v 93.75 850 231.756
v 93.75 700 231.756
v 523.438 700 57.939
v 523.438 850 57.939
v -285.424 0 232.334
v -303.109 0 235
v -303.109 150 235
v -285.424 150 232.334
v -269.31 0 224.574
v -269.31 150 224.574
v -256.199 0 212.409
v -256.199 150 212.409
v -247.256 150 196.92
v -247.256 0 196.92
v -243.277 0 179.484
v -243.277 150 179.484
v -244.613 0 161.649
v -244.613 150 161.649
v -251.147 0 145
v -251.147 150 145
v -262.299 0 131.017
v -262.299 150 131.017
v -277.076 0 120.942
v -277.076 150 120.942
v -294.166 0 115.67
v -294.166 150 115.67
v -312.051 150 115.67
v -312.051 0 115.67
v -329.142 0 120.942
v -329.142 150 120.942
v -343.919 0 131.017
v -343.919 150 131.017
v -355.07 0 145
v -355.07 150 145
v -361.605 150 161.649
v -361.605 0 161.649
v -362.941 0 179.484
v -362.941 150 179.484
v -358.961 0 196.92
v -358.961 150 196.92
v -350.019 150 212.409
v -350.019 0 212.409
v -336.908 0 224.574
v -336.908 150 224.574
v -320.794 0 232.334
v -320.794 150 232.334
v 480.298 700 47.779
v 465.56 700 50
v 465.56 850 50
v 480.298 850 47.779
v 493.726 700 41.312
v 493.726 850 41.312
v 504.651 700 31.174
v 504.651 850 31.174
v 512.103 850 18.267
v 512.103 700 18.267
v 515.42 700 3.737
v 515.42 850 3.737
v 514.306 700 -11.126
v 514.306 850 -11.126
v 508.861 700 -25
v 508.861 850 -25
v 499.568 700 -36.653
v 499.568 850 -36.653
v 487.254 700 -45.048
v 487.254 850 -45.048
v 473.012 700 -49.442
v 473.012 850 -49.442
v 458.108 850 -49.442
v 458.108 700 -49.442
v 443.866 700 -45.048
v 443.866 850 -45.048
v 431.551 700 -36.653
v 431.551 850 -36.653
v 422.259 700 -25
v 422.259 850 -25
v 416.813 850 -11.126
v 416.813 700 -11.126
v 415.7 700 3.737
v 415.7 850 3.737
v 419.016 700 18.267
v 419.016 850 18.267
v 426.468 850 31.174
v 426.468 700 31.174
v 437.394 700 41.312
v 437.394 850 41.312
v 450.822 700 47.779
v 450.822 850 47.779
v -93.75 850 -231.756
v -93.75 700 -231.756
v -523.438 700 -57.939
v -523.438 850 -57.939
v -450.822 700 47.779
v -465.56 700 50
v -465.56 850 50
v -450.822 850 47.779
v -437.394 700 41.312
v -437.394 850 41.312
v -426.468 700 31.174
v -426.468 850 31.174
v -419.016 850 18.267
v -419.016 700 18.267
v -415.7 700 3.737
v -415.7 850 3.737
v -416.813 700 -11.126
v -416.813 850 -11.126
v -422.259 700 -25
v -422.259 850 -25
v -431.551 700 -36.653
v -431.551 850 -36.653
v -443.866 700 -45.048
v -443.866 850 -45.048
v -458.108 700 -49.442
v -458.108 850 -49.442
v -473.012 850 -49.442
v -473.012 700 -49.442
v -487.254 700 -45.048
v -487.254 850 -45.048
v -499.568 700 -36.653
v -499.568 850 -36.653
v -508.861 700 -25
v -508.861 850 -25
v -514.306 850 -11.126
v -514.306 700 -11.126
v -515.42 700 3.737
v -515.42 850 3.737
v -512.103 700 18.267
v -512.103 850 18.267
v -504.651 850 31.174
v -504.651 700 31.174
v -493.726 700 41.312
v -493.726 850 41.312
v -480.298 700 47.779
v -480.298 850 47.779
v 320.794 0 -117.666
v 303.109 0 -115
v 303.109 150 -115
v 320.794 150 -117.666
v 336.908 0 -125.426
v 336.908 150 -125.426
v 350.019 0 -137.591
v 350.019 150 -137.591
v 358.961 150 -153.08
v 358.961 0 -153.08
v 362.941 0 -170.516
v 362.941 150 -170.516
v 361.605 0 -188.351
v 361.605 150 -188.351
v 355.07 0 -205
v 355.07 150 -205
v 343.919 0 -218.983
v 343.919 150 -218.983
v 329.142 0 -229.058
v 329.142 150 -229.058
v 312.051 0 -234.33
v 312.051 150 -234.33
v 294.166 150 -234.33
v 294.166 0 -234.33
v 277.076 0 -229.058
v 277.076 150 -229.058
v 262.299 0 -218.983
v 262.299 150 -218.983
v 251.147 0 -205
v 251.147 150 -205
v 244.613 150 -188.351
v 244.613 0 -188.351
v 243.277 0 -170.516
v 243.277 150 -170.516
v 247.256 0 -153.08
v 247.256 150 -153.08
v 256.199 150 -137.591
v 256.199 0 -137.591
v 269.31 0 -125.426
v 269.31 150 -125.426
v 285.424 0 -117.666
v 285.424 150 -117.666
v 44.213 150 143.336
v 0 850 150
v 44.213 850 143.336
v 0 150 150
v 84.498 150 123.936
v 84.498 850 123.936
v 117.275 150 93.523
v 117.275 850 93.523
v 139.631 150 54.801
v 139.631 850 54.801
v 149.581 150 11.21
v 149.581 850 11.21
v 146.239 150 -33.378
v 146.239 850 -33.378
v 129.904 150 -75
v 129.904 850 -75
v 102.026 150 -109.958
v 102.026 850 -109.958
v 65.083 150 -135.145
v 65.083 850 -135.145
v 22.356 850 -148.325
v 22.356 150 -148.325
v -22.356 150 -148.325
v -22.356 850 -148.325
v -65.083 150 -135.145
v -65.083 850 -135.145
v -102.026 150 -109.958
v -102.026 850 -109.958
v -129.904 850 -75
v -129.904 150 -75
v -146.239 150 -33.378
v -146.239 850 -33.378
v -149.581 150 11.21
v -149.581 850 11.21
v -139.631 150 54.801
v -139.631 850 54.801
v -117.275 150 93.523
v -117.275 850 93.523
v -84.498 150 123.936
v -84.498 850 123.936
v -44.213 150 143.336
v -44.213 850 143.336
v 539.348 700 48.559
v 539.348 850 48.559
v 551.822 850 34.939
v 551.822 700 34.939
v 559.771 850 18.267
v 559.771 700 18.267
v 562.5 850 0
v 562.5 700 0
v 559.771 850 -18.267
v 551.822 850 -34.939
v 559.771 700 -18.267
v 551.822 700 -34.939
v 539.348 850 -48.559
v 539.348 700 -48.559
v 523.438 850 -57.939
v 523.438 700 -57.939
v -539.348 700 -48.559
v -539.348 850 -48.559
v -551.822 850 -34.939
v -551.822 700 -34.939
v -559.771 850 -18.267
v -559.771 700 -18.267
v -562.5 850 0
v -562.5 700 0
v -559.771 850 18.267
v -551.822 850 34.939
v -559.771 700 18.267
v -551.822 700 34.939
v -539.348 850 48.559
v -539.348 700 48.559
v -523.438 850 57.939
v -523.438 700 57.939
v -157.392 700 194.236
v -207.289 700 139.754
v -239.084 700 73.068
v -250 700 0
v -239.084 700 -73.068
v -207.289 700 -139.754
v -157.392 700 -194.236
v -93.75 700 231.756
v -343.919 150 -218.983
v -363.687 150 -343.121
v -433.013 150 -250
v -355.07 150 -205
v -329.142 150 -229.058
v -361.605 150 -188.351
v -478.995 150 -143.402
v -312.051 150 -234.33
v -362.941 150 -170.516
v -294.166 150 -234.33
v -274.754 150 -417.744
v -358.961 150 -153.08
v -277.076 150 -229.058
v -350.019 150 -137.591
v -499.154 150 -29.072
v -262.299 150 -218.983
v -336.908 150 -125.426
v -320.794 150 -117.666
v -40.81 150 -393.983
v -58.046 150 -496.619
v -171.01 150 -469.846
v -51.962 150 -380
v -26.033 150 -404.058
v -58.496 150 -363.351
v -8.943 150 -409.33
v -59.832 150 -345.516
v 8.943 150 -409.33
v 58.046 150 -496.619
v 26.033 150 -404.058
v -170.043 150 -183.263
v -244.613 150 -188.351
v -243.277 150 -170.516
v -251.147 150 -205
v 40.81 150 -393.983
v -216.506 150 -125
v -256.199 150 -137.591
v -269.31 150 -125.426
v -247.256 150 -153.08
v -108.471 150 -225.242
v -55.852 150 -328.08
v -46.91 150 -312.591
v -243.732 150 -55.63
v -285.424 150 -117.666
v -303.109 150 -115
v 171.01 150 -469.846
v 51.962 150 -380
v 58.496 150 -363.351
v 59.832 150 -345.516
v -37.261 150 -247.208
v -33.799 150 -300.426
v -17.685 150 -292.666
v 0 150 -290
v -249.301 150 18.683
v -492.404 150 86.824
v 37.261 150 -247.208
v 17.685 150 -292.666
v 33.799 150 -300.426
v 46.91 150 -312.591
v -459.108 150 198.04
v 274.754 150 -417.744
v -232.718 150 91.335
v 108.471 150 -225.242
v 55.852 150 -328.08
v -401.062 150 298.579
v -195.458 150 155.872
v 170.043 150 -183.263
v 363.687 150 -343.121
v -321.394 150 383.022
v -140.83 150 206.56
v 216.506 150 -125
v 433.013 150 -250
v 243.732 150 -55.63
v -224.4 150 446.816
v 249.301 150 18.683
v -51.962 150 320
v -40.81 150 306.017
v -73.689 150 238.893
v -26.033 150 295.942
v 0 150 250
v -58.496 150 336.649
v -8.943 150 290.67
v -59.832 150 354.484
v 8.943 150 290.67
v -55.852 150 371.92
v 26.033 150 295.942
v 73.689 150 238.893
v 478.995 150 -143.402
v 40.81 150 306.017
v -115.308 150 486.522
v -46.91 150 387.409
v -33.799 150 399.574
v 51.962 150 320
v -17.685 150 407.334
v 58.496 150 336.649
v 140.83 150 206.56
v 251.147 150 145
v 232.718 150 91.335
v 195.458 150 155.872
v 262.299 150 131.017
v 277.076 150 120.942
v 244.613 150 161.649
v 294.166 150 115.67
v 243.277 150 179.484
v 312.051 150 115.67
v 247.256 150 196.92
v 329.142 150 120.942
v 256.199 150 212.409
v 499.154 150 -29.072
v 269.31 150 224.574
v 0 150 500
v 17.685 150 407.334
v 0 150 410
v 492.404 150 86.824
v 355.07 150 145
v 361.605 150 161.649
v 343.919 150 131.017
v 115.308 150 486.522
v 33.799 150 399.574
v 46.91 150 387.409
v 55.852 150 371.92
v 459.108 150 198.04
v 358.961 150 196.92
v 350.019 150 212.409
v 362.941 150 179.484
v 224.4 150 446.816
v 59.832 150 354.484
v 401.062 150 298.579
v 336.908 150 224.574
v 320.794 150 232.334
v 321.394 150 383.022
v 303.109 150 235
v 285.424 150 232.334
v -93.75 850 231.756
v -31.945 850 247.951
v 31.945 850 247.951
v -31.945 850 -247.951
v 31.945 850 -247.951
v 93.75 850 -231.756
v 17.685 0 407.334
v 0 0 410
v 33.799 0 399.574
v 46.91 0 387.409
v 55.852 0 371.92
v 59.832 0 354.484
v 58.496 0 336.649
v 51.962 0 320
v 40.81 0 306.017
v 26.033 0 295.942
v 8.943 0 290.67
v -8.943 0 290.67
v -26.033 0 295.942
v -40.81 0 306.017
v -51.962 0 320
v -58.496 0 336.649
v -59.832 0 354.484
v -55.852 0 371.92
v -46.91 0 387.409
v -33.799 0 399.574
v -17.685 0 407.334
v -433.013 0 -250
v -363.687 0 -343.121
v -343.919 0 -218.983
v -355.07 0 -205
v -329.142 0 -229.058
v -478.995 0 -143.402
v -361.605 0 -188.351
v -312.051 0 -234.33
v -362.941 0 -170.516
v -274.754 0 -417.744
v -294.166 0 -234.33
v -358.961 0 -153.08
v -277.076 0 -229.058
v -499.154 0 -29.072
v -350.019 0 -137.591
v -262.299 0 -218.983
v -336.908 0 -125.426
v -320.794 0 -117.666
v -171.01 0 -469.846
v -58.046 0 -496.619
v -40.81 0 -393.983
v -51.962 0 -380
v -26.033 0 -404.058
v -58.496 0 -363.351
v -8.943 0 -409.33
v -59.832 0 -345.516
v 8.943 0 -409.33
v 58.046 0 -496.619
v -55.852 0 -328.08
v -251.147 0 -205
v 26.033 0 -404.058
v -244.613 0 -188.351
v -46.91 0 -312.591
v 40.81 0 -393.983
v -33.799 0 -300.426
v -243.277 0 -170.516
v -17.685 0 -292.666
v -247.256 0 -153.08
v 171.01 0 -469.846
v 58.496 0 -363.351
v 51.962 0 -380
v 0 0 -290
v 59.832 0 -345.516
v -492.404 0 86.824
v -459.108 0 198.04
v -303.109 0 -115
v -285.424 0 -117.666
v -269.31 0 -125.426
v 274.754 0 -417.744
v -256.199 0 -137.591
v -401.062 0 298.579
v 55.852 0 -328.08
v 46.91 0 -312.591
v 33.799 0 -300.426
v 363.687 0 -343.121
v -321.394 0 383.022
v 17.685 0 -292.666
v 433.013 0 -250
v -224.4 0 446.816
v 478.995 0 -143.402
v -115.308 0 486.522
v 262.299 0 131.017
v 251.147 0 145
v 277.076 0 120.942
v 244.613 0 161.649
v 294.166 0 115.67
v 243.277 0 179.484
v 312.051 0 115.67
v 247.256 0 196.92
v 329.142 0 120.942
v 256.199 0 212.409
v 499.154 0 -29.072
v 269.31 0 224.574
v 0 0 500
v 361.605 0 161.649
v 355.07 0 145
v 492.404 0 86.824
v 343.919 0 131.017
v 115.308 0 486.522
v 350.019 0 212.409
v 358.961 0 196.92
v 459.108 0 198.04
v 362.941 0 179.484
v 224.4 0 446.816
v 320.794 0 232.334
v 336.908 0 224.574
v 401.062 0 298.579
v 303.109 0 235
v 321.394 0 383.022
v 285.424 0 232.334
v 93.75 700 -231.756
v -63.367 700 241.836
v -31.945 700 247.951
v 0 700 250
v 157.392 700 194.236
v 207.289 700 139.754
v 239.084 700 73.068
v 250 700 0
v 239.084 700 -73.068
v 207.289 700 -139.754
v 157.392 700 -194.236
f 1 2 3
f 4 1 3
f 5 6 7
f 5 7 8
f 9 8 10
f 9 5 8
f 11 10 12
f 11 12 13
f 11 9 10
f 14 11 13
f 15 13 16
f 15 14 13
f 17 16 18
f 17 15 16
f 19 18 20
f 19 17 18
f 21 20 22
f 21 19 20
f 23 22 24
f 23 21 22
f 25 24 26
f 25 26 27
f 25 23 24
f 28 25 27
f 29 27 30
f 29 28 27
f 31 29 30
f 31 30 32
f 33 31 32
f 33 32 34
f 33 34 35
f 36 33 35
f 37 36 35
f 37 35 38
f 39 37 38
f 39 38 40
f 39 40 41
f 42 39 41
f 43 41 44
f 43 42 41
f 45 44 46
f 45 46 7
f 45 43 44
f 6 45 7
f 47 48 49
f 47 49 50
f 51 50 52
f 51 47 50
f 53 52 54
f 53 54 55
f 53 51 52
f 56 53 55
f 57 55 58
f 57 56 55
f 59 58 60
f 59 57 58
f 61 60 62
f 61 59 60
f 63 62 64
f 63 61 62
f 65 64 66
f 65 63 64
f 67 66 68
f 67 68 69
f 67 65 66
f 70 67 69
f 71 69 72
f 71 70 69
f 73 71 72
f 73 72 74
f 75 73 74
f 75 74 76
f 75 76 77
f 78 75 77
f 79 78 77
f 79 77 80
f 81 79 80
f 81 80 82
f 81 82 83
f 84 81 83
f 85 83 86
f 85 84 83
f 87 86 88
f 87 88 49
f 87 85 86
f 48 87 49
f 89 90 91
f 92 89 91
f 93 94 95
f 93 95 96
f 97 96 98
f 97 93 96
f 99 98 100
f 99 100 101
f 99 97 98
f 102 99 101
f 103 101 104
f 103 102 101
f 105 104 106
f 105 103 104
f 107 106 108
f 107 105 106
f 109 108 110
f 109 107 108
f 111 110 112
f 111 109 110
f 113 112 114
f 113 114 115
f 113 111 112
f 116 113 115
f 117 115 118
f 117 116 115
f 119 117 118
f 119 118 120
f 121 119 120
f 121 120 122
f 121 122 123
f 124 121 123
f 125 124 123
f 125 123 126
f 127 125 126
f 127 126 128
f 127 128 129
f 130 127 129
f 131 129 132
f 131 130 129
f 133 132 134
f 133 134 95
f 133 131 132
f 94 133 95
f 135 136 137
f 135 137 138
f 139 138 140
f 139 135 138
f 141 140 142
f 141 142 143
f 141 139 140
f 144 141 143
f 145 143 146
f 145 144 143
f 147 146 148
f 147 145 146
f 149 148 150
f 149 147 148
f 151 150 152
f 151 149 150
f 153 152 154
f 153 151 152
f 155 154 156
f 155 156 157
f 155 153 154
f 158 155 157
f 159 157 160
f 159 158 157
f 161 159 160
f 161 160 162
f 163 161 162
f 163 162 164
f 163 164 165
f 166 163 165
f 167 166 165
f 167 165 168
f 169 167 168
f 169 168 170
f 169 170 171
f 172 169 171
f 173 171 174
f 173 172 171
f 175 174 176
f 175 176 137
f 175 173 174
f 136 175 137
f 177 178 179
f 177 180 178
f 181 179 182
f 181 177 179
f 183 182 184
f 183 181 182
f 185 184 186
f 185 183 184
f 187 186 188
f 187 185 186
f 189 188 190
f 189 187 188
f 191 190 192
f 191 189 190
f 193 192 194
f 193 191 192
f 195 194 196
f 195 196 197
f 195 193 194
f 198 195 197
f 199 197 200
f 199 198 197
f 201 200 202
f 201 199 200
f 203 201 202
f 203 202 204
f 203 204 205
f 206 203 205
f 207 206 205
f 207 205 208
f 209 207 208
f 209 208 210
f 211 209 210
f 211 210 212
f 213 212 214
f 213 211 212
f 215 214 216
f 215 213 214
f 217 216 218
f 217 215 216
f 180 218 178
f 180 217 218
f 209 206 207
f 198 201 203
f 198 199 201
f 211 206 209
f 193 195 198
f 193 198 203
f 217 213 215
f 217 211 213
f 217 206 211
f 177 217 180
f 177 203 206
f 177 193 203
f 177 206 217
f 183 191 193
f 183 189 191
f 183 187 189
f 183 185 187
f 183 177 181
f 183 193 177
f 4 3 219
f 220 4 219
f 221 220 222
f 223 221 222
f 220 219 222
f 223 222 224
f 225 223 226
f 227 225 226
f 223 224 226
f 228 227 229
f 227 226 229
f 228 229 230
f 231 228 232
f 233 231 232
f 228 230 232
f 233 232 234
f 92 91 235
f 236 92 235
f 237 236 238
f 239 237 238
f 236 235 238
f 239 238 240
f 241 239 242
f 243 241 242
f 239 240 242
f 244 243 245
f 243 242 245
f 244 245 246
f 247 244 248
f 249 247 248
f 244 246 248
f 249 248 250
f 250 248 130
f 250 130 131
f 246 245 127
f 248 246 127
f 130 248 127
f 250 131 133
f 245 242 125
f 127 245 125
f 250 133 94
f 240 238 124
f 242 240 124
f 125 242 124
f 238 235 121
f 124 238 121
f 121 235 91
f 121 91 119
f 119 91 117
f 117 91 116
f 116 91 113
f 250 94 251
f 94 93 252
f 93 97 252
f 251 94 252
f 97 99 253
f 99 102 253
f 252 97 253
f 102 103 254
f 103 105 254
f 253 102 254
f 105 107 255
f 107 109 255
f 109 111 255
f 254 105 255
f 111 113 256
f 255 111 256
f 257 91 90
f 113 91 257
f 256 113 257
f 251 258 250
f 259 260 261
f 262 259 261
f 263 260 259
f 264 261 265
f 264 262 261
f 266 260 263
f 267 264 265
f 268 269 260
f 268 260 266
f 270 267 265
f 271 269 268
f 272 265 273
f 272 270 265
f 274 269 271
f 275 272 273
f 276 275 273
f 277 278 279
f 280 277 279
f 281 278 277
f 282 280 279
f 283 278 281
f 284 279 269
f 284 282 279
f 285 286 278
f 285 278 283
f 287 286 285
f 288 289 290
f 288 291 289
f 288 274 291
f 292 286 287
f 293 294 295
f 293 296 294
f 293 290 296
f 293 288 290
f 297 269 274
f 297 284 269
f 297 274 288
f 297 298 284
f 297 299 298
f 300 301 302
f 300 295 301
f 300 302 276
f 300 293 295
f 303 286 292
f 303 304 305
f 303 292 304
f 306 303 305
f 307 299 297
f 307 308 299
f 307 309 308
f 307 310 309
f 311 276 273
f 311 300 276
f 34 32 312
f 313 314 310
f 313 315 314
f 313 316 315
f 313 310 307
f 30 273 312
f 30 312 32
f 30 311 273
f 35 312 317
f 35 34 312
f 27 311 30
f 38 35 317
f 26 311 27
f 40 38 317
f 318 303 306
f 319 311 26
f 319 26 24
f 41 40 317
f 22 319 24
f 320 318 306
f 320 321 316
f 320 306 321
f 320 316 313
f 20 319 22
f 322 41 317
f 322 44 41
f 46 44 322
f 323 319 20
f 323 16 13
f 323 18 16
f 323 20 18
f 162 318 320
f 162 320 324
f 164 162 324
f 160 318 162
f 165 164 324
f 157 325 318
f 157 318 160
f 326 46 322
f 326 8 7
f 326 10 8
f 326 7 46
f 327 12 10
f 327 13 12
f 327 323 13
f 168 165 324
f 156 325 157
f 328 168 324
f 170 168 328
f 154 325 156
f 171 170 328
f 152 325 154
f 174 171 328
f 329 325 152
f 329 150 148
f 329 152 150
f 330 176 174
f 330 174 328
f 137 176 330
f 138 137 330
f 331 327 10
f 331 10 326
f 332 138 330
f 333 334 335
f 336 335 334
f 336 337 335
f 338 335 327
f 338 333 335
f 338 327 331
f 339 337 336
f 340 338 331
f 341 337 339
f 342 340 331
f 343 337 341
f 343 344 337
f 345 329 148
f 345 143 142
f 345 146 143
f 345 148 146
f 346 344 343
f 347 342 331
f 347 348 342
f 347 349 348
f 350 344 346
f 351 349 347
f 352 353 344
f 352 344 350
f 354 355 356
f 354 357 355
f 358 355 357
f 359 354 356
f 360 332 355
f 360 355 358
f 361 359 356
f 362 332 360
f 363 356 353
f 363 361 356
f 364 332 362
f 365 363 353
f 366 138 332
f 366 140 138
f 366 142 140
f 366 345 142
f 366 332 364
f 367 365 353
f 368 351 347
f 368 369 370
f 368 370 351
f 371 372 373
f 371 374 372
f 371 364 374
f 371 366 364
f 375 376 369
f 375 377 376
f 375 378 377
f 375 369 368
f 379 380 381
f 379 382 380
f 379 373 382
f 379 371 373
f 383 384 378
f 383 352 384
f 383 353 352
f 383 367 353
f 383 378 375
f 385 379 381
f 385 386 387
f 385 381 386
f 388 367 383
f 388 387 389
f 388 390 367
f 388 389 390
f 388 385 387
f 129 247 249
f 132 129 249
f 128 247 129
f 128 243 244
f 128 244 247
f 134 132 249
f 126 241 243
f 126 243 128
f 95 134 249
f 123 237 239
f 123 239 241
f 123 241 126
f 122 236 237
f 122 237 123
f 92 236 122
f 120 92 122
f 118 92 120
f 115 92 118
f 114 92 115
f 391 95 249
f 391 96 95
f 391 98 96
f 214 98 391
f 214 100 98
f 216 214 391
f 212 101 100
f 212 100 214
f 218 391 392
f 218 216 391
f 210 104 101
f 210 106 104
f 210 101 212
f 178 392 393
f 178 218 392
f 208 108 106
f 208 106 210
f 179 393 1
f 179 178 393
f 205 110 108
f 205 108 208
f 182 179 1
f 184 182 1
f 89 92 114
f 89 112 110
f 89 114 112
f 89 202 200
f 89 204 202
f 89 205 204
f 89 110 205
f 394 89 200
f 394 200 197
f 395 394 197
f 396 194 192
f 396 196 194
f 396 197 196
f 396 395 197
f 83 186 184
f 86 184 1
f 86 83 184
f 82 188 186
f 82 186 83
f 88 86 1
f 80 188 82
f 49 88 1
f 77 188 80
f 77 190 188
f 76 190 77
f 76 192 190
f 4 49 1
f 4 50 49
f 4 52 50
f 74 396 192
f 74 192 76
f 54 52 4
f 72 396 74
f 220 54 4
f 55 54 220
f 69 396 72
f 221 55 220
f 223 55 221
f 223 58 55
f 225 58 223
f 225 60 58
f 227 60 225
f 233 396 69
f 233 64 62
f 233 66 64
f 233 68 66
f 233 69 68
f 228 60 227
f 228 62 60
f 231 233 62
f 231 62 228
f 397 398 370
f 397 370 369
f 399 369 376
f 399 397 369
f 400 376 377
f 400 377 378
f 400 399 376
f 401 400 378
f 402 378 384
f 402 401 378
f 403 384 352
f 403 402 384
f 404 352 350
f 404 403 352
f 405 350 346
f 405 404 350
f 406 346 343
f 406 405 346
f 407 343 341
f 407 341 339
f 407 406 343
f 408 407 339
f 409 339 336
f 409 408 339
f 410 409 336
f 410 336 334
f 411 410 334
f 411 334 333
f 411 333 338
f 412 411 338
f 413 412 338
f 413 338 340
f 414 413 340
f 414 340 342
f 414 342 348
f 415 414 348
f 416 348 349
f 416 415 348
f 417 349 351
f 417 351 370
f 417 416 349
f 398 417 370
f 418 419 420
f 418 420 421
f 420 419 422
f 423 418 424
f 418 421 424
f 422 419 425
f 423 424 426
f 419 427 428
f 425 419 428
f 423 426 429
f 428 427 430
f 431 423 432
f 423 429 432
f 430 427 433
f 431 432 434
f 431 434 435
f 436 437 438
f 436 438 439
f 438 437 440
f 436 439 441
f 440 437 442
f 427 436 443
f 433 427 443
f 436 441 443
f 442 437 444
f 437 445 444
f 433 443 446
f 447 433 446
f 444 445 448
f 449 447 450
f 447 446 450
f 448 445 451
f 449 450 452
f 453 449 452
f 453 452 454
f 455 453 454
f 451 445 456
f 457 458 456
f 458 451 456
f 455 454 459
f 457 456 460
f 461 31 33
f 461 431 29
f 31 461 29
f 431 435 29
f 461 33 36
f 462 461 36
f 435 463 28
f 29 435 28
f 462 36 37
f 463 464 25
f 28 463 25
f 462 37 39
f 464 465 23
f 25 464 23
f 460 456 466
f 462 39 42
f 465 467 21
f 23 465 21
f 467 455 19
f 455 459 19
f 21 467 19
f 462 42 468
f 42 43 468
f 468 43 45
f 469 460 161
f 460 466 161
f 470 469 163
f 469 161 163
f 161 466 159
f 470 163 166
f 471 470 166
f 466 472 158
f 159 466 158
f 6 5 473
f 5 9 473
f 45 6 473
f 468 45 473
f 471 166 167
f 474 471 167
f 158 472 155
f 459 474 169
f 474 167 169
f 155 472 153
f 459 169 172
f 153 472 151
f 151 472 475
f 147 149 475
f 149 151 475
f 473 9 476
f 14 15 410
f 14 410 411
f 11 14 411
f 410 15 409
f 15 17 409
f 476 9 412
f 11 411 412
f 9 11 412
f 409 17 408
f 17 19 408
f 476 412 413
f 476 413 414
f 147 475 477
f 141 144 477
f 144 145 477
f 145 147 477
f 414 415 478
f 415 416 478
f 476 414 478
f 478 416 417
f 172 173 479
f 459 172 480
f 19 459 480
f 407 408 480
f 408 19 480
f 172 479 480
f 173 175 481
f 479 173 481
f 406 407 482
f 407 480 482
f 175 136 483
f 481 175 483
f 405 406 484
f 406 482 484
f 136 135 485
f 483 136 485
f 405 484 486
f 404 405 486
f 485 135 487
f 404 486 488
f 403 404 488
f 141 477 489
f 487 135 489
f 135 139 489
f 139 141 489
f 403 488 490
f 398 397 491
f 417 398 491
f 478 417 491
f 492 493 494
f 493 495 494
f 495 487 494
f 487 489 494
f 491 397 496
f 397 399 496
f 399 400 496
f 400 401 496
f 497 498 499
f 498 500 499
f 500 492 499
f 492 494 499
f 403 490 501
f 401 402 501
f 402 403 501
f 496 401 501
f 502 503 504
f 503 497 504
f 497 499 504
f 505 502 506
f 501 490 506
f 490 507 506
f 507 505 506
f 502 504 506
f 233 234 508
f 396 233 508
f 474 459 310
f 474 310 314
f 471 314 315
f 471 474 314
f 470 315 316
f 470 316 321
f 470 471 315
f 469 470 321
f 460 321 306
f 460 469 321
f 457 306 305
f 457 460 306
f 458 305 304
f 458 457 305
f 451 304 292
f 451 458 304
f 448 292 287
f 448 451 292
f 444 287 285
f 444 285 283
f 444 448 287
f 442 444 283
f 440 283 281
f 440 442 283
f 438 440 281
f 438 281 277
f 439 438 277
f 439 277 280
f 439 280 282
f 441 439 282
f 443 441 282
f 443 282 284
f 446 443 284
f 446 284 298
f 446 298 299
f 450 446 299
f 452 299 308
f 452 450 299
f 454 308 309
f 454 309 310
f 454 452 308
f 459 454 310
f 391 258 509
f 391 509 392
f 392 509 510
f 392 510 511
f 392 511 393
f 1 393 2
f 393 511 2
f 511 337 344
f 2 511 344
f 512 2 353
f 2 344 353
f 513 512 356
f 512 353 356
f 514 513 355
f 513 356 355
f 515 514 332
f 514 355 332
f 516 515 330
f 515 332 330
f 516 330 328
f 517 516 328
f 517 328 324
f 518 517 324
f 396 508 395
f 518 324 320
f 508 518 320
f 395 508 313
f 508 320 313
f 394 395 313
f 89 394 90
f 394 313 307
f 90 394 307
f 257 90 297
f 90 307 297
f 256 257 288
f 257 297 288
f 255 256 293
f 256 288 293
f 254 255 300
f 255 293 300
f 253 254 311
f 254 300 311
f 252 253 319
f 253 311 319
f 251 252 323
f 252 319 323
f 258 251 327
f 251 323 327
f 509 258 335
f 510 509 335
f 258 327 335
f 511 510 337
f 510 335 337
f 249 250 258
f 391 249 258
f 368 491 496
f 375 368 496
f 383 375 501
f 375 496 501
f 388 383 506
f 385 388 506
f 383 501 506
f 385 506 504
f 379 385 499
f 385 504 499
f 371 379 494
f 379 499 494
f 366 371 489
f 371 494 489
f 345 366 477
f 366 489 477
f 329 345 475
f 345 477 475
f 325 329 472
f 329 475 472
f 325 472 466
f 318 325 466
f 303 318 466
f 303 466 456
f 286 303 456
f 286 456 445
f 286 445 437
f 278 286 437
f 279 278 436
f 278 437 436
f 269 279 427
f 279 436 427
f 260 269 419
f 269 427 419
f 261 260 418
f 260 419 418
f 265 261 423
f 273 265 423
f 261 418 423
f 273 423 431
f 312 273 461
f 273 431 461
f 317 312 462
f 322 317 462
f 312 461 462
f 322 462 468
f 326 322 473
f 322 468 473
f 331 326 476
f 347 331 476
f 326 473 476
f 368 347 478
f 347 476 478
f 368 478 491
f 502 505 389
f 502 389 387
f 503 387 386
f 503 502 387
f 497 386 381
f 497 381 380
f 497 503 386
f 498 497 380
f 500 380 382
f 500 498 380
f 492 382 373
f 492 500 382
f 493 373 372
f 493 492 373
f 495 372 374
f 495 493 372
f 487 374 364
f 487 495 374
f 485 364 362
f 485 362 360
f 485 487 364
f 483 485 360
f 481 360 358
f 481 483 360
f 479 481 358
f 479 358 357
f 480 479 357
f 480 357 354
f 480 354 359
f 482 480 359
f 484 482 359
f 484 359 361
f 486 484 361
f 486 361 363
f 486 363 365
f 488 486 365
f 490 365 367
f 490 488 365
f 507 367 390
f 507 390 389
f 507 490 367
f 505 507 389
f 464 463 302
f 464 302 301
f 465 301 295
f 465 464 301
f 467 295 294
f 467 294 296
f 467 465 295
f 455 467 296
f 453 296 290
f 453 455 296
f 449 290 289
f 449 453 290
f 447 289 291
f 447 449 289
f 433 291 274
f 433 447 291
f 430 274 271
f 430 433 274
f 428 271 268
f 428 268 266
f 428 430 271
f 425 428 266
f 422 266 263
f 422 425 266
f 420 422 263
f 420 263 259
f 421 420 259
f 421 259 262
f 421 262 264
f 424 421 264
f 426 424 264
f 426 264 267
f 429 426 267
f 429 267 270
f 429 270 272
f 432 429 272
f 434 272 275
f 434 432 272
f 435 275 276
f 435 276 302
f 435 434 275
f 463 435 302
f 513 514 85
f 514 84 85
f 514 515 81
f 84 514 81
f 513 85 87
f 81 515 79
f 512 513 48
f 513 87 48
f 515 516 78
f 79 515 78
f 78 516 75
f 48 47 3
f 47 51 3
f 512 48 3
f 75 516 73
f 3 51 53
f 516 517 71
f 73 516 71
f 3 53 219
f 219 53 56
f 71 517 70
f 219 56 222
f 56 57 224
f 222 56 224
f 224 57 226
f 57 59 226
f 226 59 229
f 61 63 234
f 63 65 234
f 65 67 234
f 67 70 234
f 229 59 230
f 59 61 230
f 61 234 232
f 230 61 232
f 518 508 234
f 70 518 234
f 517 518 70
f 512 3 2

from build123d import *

# Parameters (mm, degrees)
SKETCH1_R           = 500
SKETCH1_R_2         = 60
BOSS_EXTRUDE1_DEPTH = 150
SKETCH3_R           = 250
SKETCH3_R_2         = 150
BOSS_EXTRUDE2_DEPTH = 700
SKETCH5_R           = 50
SKETCH5_R_2         = 250
SKETCH5_R_3         = 150
BOSS_EXTRUDE3_DEPTH = 150


with BuildPart() as part:
    # Sketch1 → Boss-Extrude1 (new body)
    with BuildSketch(Plane(origin=(0, 0, 0), x_dir=(1, 0, 0), z_dir=(0, 1, 0))):
        with Locations(Location((0, 0, 0), (0, 0, 270))):
            Circle(SKETCH1_R)
        with Locations(Location((0, 350, 0), (0, 0, 270))):
            Circle(SKETCH1_R_2, mode=Mode.SUBTRACT)
        with Locations(Location((303.108891325, 175, 0), (0, 0, 270))):
            Circle(SKETCH1_R_2, mode=Mode.SUBTRACT)
        with Locations(Location((303.108891325, -175, 0), (0, 0, 270))):
            Circle(SKETCH1_R_2, mode=Mode.SUBTRACT)
        with Locations(Location((0, -350, 0), (0, 0, 270))):
            Circle(SKETCH1_R_2, mode=Mode.SUBTRACT)
        with Locations(Location((-303.108891325, -175, 0), (0, 0, 270))):
            Circle(SKETCH1_R_2, mode=Mode.SUBTRACT)
        with Locations(Location((-303.108891325, 175, 0), (0, 0, 270))):
            Circle(SKETCH1_R_2, mode=Mode.SUBTRACT)
    extrude(amount=BOSS_EXTRUDE1_DEPTH)

    # Sketch3 → Boss-Extrude2 (add)
    with BuildSketch(Plane(origin=(0, 0, 0), x_dir=(1, 0, 0), z_dir=(0, 1, 0))):
        with Locations(Location((0, 0, 0), (0, 0, 270))):
            Circle(SKETCH3_R)
        with Locations(Location((0, 0, 0), (0, 0, 270))):
            Circle(SKETCH3_R_2, mode=Mode.SUBTRACT)
    extrude(amount=BOSS_EXTRUDE2_DEPTH)

    # Sketch5 → Boss-Extrude3 (add)
    # profile 1 of 3: a face of its own
    with BuildSketch(Plane(origin=(0, 700, 0), x_dir=(1, 0, 0), z_dir=(0, 1, 0))):
        with BuildLine():
            Line((-93.75, 231.756202722), (-523.4375, 57.93905068))
            ThreePointArc((-523.4375, 57.93905068), (-562.5, 0), (-523.4375, -57.93905068))
            Line((-523.4375, -57.93905068), (-93.75, -231.756202722))
            ThreePointArc((-93.75, -231.756202722), (-250, 0), (-93.75, 231.756202722))
        make_face()
        with Locations(Location((-465.559791402, 0, 0), (0, 0, 270))):
            Circle(SKETCH5_R, mode=Mode.SUBTRACT)
    # profile 2 of 3: a face of its own
    with BuildSketch(Plane(origin=(0, 700, 0), x_dir=(1, 0, 0), z_dir=(0, 1, 0))):
        with BuildLine():
            Line((523.4375, 57.93905068), (93.75, 231.756202722))
            ThreePointArc((93.75, 231.756202722), (207.289049397, 139.754248594), (250, 0))
            ThreePointArc((250, 0), (207.289049397, -139.754248594), (93.75, -231.756202722))
            Line((93.75, -231.756202722), (523.4375, -57.93905068))
            ThreePointArc((523.4375, -57.93905068), (562.5, 0), (523.4375, 57.93905068))
        make_face()
        with Locations(Location((465.559791402, 0, 0), (0, 0, 270))):
            Circle(SKETCH5_R, mode=Mode.SUBTRACT)
    # profile 3 of 3: a face of its own
    with BuildSketch(Plane(origin=(0, 700, 0), x_dir=(1, 0, 0), z_dir=(0, 1, 0))):
        with Locations(Location((0, 0, 0), (0, 0, 112.024312837))):
            Circle(SKETCH5_R_2)
        with Locations(Location((0, 0, 0), (0, 0, 270))):
            Circle(SKETCH5_R_3, mode=Mode.SUBTRACT)
    extrude(amount=BOSS_EXTRUDE3_DEPTH)


solid = part.part
